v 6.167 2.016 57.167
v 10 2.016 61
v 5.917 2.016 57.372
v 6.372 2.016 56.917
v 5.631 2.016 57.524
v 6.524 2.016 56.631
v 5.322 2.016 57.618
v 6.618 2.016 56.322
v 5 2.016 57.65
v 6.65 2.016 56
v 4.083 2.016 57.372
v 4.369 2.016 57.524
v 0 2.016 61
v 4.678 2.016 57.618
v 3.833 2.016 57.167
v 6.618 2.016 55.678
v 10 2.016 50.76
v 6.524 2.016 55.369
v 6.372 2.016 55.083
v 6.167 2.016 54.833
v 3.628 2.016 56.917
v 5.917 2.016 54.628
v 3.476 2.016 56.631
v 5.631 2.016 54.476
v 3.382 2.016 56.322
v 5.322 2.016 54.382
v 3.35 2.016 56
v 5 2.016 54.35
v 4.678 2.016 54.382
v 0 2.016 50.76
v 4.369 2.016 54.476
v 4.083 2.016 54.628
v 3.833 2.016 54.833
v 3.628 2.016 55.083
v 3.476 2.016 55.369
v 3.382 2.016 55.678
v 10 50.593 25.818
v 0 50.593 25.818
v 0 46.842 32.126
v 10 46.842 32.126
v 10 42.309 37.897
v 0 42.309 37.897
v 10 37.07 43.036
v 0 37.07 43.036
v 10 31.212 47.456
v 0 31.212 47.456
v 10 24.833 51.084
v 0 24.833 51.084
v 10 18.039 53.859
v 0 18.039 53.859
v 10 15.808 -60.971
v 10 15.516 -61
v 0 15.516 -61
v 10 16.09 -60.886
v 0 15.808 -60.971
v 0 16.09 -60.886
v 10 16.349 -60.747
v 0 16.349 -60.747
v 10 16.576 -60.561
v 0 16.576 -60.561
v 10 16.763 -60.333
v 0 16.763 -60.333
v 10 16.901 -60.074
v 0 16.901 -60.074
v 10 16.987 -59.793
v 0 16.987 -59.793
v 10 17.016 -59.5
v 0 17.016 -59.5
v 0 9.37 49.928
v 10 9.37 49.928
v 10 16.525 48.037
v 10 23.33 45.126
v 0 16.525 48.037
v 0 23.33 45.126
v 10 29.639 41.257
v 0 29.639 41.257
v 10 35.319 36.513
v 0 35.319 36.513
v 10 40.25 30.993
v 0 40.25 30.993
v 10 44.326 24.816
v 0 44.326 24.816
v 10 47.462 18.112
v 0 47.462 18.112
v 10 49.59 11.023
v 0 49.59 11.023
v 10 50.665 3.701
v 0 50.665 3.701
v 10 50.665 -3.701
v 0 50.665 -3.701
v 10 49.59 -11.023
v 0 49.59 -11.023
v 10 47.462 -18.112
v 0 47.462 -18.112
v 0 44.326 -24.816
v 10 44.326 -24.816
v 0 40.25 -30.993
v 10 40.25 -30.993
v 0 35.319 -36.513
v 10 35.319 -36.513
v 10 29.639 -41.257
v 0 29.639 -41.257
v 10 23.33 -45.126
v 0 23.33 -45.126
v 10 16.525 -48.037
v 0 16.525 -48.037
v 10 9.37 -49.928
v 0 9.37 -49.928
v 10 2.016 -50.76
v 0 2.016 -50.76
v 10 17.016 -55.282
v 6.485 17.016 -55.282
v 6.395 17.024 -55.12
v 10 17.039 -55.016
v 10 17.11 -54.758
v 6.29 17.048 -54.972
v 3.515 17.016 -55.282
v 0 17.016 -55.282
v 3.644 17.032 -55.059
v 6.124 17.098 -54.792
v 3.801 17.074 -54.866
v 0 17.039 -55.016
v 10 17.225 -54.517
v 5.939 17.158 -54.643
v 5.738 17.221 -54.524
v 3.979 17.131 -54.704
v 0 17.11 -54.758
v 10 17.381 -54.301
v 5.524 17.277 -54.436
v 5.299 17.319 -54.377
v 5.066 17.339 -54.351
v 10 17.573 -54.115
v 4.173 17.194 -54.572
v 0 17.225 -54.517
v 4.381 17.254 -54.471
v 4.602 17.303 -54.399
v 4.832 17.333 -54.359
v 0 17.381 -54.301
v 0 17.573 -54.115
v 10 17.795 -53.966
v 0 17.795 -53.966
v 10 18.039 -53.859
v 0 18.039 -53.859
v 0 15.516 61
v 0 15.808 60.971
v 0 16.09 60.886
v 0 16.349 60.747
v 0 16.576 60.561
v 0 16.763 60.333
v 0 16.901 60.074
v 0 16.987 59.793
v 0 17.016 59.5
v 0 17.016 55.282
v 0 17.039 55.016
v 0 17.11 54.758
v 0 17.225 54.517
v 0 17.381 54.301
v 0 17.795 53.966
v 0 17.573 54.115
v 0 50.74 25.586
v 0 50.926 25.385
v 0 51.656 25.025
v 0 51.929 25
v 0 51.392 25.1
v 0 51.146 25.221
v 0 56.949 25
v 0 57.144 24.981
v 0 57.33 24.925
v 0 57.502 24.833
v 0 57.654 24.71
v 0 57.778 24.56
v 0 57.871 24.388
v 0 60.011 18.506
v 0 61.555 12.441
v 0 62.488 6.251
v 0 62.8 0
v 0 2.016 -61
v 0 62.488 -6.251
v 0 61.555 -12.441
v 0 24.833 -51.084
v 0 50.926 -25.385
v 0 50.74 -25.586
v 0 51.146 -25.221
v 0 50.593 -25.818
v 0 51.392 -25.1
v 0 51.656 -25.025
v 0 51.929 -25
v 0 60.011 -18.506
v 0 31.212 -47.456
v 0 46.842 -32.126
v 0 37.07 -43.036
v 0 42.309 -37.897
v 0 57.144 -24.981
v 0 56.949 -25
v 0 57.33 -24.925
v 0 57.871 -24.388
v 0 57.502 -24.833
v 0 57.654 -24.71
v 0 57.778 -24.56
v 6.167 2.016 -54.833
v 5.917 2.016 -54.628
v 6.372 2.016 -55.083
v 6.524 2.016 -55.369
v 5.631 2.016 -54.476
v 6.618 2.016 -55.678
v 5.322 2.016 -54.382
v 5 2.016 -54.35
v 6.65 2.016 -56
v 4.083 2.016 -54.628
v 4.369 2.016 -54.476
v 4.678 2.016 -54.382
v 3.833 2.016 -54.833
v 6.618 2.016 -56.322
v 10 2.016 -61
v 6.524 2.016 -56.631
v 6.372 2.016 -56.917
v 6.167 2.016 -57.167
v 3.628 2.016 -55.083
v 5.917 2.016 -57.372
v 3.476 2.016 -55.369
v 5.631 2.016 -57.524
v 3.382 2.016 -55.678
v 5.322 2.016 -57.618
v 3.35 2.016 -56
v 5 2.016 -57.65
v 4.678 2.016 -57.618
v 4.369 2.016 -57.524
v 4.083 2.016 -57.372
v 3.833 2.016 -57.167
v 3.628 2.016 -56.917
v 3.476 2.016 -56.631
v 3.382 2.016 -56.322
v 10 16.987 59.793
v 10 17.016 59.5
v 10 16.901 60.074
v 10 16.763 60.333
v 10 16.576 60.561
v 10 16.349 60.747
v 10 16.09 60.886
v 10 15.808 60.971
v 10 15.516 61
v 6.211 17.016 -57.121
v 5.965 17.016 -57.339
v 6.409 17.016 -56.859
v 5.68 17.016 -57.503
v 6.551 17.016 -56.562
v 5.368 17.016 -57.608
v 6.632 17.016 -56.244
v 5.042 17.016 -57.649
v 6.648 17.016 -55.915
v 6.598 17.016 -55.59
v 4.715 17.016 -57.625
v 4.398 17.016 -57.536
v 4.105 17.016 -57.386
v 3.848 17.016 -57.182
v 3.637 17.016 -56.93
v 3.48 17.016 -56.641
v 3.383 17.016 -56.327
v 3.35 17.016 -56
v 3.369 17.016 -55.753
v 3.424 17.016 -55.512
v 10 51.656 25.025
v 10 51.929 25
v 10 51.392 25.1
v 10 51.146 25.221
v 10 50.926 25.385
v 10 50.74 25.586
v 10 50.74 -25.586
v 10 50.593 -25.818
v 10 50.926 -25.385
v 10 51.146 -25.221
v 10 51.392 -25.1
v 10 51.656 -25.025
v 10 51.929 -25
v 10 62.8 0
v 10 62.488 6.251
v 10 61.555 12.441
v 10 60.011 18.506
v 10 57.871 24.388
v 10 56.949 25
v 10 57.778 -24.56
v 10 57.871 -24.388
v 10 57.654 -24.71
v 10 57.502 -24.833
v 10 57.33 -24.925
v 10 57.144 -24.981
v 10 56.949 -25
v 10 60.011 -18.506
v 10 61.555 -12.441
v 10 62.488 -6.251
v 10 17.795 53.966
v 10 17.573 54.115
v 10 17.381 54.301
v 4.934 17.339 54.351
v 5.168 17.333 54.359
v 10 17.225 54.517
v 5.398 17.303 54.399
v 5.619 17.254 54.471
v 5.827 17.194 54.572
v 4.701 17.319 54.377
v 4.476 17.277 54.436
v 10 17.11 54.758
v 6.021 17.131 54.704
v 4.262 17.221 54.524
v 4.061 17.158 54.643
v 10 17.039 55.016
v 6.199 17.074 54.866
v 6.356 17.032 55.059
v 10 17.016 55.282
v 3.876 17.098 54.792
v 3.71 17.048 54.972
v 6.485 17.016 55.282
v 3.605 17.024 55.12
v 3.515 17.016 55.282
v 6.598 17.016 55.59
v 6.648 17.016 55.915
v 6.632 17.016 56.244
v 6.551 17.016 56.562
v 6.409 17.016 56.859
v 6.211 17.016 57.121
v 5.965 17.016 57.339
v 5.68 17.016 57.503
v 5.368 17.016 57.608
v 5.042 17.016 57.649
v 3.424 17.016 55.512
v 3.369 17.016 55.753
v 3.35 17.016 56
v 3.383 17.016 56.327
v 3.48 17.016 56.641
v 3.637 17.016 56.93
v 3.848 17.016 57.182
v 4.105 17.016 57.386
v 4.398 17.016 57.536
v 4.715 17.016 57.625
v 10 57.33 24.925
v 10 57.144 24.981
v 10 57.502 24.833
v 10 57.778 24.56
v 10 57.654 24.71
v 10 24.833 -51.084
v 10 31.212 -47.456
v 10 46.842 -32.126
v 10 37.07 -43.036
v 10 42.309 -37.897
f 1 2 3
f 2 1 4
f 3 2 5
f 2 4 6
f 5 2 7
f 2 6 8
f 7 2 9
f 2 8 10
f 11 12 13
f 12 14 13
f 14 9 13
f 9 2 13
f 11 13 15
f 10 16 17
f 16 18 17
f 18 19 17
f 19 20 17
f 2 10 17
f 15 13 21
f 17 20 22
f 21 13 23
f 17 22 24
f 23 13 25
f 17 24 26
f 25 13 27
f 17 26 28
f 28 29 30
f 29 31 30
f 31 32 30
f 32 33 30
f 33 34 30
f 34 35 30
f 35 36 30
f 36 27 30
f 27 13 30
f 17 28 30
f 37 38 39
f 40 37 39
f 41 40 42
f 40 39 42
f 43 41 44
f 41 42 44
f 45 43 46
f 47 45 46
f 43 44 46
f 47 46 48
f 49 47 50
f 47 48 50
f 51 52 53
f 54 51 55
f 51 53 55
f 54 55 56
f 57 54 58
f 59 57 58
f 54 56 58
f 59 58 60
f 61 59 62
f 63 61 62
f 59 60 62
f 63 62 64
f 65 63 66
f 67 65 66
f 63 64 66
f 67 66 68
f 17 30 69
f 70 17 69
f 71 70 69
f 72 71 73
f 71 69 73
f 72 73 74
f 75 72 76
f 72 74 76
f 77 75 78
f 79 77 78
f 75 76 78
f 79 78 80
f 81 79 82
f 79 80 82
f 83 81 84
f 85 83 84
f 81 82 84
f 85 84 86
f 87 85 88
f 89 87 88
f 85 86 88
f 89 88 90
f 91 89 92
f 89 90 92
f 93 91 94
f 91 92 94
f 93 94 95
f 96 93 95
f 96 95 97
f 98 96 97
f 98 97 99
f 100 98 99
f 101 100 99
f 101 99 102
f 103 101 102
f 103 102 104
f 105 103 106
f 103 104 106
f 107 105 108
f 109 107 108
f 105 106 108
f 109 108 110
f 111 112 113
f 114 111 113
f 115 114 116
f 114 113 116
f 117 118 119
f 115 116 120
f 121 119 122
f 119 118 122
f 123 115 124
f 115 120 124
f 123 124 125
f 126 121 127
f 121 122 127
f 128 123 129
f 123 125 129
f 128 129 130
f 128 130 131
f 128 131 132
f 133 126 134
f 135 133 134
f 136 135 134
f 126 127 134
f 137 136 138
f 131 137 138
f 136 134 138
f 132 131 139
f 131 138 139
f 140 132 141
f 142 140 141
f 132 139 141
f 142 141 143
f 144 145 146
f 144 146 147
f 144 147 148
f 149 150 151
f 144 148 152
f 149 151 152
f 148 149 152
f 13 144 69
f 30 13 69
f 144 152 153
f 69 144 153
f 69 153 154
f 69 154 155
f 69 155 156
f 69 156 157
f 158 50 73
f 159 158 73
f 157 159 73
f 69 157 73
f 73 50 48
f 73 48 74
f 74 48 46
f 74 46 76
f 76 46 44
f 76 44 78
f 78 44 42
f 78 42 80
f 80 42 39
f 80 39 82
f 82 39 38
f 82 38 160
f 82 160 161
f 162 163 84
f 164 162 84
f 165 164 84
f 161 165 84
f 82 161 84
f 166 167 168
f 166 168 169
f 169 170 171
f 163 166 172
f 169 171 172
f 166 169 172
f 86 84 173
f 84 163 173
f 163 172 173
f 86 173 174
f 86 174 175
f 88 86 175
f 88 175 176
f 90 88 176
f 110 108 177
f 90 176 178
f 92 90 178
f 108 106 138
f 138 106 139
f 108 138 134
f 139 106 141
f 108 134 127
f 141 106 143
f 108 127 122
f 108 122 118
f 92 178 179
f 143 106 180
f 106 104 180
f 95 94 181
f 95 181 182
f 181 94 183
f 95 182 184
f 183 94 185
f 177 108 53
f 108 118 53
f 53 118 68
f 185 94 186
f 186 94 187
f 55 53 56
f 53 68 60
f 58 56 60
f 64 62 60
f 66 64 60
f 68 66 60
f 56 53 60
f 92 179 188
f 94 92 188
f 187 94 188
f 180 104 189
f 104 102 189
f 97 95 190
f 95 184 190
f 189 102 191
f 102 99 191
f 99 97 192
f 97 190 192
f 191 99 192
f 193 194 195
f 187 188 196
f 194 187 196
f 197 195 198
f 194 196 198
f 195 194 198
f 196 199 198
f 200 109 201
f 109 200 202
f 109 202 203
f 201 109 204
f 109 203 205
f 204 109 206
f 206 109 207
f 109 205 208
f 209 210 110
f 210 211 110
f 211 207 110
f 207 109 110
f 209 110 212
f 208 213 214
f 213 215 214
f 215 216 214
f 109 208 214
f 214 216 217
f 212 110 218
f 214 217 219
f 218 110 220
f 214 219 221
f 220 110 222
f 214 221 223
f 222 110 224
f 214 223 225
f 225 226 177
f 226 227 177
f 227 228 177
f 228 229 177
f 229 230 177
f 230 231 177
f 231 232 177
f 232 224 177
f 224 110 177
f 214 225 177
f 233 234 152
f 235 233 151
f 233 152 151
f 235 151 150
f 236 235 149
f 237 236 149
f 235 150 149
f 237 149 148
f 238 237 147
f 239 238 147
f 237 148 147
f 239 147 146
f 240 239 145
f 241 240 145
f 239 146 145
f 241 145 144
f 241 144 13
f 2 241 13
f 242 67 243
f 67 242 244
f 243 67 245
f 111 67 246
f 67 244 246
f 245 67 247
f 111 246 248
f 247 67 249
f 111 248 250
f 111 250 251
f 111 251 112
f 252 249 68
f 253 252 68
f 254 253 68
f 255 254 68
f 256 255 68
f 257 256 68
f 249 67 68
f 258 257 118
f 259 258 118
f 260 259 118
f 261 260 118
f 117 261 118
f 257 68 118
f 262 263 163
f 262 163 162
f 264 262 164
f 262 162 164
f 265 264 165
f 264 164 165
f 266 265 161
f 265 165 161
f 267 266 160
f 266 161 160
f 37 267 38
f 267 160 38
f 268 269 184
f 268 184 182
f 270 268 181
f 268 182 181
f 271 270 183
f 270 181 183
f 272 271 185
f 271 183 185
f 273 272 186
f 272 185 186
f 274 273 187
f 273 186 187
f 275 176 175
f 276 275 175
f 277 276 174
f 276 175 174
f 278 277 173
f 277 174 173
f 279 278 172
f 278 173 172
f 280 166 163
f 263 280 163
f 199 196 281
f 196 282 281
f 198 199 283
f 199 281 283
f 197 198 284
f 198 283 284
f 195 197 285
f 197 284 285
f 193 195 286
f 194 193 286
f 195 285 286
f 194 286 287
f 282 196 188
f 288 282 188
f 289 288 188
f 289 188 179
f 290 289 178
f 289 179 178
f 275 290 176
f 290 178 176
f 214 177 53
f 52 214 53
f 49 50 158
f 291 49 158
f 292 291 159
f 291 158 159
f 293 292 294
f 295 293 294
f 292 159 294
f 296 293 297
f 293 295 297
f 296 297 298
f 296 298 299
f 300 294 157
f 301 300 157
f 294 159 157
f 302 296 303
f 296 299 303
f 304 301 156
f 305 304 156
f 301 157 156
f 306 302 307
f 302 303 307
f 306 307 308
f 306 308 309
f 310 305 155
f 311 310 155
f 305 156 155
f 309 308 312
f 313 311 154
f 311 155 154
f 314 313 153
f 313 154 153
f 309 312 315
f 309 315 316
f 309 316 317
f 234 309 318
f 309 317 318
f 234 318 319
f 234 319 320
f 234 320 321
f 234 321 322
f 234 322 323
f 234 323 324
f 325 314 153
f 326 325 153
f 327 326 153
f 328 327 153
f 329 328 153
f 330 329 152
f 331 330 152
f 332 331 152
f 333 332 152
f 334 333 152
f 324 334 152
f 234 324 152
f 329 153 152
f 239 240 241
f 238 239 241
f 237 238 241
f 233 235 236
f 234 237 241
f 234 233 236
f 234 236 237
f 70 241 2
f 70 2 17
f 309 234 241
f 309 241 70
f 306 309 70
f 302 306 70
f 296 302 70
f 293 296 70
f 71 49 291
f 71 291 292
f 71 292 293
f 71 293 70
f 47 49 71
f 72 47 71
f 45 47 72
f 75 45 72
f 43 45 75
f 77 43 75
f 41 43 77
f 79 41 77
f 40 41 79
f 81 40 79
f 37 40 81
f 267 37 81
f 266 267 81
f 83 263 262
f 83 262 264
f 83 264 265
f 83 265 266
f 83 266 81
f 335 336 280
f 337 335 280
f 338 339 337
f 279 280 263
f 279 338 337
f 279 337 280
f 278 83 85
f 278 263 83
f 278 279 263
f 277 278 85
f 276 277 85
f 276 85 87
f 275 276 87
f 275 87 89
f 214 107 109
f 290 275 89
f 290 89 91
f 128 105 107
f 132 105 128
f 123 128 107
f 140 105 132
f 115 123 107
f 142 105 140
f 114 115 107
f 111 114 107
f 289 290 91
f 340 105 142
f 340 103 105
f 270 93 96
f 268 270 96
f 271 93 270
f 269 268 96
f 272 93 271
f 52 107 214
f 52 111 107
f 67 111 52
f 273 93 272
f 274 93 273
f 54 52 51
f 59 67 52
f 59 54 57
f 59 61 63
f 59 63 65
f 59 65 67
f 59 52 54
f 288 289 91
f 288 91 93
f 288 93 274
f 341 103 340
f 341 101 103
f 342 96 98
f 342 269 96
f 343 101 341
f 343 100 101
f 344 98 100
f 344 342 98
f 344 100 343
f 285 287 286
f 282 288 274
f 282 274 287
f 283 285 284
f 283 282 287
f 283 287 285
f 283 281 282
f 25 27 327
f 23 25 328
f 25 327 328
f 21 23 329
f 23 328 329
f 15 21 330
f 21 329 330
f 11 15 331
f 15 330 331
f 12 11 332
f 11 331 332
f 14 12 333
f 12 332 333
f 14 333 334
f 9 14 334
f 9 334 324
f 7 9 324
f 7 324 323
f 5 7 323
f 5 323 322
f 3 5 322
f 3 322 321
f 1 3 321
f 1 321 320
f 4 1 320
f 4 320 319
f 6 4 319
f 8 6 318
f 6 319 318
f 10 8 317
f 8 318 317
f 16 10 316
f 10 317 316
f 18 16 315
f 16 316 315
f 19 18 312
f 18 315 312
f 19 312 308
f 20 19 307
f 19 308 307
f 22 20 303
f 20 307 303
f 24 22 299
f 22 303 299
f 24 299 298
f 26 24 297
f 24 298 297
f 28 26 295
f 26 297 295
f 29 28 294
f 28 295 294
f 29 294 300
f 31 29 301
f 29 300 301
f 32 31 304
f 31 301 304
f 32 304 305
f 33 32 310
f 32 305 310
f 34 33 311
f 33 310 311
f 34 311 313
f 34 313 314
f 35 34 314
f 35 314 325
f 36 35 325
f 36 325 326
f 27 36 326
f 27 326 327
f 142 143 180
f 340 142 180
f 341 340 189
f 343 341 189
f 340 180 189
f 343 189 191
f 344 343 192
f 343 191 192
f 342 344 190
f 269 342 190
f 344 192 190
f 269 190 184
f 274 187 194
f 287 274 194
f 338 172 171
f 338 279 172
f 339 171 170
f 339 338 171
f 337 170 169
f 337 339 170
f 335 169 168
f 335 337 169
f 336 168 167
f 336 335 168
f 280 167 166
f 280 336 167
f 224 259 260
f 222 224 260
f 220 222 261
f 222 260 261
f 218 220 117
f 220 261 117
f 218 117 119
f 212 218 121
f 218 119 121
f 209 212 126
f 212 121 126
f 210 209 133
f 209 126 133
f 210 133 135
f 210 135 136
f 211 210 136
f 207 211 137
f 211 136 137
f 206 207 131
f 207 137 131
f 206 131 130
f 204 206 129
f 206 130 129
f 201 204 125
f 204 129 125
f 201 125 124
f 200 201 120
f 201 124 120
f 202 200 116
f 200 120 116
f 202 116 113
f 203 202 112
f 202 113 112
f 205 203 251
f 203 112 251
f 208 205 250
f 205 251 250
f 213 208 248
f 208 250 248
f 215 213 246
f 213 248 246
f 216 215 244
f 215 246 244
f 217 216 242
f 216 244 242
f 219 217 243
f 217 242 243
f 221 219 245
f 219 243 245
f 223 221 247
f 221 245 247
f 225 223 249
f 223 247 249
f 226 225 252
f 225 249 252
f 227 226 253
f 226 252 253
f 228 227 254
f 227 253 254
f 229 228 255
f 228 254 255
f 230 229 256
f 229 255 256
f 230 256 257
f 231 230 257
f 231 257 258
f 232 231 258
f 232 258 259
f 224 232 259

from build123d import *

# Parameters (mm, degrees)
BOSS_EXTRUDE1_DEPTH = 10
M4_TAPPED_HOLE1_D   = 3.3
FILLET1_R           = 1


with BuildPart() as part:
    # Sketch1 → Boss-Extrude1 (new body)
    with BuildSketch(Plane(origin=(0, 0, 0), x_dir=(0, 0, -1), z_dir=(1, 0, 0))):
        with BuildLine():
            ThreePointArc((25, 57.609374237), (12.766583292, 61.488652214), (0, 62.8))
            ThreePointArc((0, 62.8), (-12.766583292, 61.488652214), (-25, 57.609374237))
            Line((-25, 57.609374237), (-25, 51.929182547))
            ThreePointArc((-25, 51.929182547), (-25.220795702, 51.145833095), (-25.818181818, 50.593097233))
            ThreePointArc((-25.818181818, 50.593097233), (-43.035646203, 37.069841595), (-53.859344034, 18.039153533))
            ThreePointArc((-53.859344034, 18.039153533), (-54.405495004, 17.298046479), (-55.281685866, 17.01553963))
            Line((-55.281685866, 17.01553963), (-59.5, 17.01553963))
            ThreePointArc((-59.5, 17.01553963), (-60.560660172, 16.576199802), (-61, 15.51553963))
            Line((-61, 15.51553963), (-61, 2.01553963))
            Line((-61, 2.01553963), (-50.76, 2.01553963))
            ThreePointArc((-50.76, 2.01553963), (0, 50.8), (50.76, 2.01553963))
            Line((50.76, 2.01553963), (61, 2.01553963))
            Line((61, 2.01553963), (61, 15.51553963))
            ThreePointArc((61, 15.51553963), (60.560660172, 16.576199802), (59.5, 17.01553963))
            Line((59.5, 17.01553963), (55.281685866, 17.01553963))
            ThreePointArc((55.281685866, 17.01553963), (54.405495004, 17.298046479), (53.859344034, 18.039153533))
            ThreePointArc((53.859344034, 18.039153533), (43.035646203, 37.069841595), (25.818181818, 50.593097233))
            ThreePointArc((25.818181818, 50.593097233), (25.220795702, 51.145833095), (25, 51.929182547))
            Line((25, 51.929182547), (25, 57.609374237))
        make_face()
    extrude(amount=BOSS_EXTRUDE1_DEPTH)

    # M4 Tapped Hole1 (through all)
    with Locations(Plane.XZ.offset(-2.01553963)):
        with Locations((5, -56), (5, 56)):
            Hole(M4_TAPPED_HOLE1_D / 2)

    # Fillet1
    fillet1_edges = [part.edges().sort_by_distance(p)[0] for p in [
        (5, 57.609374237, -25),
        (5, 57.609374237, 25),
    ]]
    fillet(fillet1_edges, radius=FILLET1_R)


solid = part.part
